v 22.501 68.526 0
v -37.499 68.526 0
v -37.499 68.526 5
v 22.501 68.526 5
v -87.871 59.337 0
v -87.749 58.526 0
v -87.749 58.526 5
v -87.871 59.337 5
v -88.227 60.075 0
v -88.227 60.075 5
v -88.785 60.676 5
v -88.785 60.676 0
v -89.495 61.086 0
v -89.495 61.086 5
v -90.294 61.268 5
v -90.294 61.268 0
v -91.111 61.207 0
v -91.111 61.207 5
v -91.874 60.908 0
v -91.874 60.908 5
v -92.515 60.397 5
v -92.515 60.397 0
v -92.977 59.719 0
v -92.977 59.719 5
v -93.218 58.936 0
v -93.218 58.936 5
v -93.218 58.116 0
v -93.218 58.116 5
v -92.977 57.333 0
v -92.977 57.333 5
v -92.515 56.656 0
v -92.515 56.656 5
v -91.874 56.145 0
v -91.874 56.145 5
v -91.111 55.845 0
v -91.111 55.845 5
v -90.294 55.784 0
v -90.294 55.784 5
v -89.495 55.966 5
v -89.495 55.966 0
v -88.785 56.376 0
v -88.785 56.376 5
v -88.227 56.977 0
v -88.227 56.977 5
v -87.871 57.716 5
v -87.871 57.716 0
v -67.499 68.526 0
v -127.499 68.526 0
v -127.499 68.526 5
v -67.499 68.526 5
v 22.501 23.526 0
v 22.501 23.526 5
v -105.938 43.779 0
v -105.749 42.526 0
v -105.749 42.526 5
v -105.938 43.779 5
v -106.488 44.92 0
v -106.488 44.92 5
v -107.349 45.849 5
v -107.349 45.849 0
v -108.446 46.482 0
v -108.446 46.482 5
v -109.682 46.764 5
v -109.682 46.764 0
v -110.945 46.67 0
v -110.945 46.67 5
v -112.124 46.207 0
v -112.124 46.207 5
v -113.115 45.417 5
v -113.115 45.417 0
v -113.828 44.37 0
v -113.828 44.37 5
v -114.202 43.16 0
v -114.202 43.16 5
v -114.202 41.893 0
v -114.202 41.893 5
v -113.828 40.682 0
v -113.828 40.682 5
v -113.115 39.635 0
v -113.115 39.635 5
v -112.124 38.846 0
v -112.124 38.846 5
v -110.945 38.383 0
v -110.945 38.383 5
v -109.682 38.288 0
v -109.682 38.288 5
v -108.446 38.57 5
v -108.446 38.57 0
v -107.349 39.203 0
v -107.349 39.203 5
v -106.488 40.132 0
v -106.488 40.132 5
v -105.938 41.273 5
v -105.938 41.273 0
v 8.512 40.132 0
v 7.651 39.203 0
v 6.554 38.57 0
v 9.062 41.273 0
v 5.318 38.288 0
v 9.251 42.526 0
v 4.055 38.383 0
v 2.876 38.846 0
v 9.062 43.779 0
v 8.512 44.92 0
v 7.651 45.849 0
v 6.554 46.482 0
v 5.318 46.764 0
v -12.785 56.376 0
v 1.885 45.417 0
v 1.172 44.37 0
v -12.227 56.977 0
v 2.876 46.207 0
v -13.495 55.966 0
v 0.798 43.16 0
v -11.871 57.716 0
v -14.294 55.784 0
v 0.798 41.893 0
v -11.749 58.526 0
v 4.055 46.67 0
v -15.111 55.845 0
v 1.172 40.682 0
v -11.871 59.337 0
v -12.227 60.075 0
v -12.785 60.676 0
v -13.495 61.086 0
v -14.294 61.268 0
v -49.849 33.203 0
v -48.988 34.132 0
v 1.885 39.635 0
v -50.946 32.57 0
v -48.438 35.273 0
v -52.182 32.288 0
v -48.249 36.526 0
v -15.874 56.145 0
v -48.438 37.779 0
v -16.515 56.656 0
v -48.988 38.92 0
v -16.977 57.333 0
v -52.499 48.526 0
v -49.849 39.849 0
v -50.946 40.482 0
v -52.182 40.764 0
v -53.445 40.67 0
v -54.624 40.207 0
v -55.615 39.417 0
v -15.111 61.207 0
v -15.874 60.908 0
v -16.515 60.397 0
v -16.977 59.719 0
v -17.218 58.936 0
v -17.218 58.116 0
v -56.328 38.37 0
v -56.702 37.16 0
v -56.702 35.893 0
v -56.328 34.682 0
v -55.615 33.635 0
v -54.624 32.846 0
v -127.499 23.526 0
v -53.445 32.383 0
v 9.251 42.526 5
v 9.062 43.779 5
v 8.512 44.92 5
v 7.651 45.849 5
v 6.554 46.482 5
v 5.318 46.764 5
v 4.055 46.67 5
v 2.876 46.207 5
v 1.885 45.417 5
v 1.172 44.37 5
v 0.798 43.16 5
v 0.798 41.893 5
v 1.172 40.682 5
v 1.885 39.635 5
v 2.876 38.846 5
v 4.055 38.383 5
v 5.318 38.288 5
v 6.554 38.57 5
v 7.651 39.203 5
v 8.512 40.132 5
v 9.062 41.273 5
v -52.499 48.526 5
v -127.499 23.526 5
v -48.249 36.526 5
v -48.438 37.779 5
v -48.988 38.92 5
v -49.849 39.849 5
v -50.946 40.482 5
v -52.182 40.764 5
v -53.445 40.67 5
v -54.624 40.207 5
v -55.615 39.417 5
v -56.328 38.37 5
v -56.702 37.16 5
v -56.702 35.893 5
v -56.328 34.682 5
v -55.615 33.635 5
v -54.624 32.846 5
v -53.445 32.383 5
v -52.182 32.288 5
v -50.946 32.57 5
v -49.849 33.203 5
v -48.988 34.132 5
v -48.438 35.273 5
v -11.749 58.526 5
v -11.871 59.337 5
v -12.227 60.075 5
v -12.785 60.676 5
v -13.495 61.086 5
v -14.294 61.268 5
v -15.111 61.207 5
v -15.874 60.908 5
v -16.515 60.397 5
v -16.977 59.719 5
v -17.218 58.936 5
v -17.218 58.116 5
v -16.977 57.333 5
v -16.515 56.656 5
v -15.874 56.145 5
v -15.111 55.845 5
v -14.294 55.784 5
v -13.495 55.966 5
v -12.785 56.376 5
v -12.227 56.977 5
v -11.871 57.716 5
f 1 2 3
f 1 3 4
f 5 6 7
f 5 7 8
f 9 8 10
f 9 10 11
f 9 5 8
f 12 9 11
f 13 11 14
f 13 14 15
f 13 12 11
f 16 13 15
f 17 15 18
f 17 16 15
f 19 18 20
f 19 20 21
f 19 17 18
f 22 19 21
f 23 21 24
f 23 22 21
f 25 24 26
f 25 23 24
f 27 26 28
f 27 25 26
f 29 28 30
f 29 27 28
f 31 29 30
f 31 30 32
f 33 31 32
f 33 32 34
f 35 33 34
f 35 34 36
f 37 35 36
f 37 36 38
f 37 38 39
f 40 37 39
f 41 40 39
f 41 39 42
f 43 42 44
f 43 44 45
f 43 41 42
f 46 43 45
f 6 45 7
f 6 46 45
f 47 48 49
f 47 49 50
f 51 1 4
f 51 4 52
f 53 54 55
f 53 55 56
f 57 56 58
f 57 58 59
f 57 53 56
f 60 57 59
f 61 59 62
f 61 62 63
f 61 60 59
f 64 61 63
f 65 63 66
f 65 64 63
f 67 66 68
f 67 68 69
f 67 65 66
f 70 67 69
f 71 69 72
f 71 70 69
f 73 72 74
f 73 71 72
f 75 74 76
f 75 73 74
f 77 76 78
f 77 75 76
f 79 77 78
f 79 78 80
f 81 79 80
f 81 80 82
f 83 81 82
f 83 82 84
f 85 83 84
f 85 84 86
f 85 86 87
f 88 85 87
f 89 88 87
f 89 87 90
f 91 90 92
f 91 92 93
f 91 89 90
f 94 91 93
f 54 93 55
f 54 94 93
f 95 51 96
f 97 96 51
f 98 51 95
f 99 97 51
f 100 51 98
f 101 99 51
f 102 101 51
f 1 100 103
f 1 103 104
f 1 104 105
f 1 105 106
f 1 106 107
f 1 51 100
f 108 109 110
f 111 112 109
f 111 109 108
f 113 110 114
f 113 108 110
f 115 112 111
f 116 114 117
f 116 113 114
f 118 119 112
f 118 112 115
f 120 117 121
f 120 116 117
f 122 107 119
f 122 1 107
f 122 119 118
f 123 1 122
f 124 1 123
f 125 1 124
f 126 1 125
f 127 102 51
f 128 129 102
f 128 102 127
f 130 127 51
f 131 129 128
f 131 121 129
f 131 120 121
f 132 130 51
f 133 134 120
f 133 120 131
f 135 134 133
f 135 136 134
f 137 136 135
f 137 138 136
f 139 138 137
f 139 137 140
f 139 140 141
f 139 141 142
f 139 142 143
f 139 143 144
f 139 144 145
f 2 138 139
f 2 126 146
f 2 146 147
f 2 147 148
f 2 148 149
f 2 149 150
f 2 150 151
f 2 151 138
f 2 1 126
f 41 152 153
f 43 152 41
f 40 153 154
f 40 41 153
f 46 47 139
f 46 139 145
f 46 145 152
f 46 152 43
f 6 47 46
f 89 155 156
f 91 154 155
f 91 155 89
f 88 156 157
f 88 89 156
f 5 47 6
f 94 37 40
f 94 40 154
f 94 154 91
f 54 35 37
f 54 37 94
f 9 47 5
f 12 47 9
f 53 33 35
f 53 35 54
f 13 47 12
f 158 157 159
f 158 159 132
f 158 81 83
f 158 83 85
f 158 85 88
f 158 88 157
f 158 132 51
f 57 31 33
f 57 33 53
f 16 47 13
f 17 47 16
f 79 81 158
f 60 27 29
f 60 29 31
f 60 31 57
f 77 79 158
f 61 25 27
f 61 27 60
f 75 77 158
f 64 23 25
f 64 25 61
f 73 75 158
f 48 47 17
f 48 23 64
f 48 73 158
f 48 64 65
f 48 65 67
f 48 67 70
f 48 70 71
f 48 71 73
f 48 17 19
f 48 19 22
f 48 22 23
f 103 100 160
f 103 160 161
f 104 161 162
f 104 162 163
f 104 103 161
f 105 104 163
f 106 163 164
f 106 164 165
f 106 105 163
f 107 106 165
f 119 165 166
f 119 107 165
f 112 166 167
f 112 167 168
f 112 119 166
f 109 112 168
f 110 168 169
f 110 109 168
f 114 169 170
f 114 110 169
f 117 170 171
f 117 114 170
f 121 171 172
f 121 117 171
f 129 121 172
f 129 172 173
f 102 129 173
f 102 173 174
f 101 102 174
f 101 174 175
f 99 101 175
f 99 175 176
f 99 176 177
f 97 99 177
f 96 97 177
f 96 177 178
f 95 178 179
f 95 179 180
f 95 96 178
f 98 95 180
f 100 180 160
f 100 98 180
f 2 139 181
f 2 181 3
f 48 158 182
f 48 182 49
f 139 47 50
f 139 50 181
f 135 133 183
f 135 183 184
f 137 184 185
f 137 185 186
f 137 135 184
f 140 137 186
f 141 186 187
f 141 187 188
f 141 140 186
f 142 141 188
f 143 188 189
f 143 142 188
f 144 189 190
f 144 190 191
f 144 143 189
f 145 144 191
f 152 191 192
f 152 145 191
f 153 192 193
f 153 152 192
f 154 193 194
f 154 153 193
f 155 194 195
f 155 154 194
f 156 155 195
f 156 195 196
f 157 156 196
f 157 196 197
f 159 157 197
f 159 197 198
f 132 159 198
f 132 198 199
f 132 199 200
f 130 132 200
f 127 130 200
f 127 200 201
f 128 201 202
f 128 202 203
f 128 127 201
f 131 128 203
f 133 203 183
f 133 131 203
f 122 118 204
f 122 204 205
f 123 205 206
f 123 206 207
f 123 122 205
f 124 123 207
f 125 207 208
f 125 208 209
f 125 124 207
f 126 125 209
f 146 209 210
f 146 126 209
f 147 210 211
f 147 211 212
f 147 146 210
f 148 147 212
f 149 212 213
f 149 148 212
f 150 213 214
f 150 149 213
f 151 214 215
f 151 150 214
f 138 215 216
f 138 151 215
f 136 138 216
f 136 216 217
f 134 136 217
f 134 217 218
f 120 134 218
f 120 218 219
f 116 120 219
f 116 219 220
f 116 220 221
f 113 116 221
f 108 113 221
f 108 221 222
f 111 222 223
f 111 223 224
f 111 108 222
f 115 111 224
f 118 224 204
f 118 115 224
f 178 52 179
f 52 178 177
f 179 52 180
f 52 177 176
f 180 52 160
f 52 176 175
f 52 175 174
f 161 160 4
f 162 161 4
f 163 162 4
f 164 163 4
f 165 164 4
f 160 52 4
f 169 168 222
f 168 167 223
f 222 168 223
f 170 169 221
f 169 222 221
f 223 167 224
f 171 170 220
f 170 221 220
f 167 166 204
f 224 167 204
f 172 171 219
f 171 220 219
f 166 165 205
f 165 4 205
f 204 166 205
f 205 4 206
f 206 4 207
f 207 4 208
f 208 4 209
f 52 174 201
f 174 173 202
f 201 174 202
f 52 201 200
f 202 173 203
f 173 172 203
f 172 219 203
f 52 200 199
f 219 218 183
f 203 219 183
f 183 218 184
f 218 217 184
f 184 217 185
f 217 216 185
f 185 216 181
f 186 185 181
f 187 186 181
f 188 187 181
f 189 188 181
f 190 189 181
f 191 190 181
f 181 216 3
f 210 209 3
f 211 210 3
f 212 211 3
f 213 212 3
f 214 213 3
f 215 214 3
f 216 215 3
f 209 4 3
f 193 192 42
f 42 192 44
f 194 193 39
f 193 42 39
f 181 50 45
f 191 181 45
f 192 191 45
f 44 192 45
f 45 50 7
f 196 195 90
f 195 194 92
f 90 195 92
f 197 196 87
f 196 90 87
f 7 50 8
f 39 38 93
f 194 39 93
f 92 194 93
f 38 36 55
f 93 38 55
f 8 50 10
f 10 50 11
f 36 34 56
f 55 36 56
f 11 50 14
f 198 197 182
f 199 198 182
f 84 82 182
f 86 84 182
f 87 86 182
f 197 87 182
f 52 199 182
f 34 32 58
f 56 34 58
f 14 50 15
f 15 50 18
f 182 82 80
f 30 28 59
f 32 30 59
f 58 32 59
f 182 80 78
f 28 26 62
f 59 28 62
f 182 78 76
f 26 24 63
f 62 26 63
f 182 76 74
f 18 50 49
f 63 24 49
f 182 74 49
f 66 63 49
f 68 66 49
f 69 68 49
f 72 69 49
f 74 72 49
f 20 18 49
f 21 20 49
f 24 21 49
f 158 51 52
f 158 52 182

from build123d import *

# Parameters (mm, degrees)
SKETCH1_R           = 4.25
SKETCH1_R_2         = 2.75
BOSS_EXTRUDE1_DEPTH = 5


with BuildPart() as part:
    # Sketch1 → Boss-Extrude1 (new body)
    with BuildSketch(Plane.XY):
        Polygon((-127.499192618, 23.526116329), (-127.499192618, 68.526116329), (-67.499192618, 68.526116329), (-52.499192618, 48.526116329), (-37.499192618, 68.526116329), (22.500807382, 68.526116329), (22.500807382, 23.526116329), align=None)
        with Locations((-109.999192618, 42.526116329)):
            Circle(SKETCH1_R, mode=Mode.SUBTRACT)
        with Locations((5.000807382, 42.526116329)):
            Circle(SKETCH1_R, mode=Mode.SUBTRACT)
        with Locations((-52.499192618, 36.526116329)):
            Circle(SKETCH1_R, mode=Mode.SUBTRACT)
        with Locations((-90.499192618, 58.526116329)):
            Circle(SKETCH1_R_2, mode=Mode.SUBTRACT)
        with Locations((-14.499192618, 58.526116329)):
            Circle(SKETCH1_R_2, mode=Mode.SUBTRACT)
    extrude(amount=BOSS_EXTRUDE1_DEPTH)


solid = part.part
